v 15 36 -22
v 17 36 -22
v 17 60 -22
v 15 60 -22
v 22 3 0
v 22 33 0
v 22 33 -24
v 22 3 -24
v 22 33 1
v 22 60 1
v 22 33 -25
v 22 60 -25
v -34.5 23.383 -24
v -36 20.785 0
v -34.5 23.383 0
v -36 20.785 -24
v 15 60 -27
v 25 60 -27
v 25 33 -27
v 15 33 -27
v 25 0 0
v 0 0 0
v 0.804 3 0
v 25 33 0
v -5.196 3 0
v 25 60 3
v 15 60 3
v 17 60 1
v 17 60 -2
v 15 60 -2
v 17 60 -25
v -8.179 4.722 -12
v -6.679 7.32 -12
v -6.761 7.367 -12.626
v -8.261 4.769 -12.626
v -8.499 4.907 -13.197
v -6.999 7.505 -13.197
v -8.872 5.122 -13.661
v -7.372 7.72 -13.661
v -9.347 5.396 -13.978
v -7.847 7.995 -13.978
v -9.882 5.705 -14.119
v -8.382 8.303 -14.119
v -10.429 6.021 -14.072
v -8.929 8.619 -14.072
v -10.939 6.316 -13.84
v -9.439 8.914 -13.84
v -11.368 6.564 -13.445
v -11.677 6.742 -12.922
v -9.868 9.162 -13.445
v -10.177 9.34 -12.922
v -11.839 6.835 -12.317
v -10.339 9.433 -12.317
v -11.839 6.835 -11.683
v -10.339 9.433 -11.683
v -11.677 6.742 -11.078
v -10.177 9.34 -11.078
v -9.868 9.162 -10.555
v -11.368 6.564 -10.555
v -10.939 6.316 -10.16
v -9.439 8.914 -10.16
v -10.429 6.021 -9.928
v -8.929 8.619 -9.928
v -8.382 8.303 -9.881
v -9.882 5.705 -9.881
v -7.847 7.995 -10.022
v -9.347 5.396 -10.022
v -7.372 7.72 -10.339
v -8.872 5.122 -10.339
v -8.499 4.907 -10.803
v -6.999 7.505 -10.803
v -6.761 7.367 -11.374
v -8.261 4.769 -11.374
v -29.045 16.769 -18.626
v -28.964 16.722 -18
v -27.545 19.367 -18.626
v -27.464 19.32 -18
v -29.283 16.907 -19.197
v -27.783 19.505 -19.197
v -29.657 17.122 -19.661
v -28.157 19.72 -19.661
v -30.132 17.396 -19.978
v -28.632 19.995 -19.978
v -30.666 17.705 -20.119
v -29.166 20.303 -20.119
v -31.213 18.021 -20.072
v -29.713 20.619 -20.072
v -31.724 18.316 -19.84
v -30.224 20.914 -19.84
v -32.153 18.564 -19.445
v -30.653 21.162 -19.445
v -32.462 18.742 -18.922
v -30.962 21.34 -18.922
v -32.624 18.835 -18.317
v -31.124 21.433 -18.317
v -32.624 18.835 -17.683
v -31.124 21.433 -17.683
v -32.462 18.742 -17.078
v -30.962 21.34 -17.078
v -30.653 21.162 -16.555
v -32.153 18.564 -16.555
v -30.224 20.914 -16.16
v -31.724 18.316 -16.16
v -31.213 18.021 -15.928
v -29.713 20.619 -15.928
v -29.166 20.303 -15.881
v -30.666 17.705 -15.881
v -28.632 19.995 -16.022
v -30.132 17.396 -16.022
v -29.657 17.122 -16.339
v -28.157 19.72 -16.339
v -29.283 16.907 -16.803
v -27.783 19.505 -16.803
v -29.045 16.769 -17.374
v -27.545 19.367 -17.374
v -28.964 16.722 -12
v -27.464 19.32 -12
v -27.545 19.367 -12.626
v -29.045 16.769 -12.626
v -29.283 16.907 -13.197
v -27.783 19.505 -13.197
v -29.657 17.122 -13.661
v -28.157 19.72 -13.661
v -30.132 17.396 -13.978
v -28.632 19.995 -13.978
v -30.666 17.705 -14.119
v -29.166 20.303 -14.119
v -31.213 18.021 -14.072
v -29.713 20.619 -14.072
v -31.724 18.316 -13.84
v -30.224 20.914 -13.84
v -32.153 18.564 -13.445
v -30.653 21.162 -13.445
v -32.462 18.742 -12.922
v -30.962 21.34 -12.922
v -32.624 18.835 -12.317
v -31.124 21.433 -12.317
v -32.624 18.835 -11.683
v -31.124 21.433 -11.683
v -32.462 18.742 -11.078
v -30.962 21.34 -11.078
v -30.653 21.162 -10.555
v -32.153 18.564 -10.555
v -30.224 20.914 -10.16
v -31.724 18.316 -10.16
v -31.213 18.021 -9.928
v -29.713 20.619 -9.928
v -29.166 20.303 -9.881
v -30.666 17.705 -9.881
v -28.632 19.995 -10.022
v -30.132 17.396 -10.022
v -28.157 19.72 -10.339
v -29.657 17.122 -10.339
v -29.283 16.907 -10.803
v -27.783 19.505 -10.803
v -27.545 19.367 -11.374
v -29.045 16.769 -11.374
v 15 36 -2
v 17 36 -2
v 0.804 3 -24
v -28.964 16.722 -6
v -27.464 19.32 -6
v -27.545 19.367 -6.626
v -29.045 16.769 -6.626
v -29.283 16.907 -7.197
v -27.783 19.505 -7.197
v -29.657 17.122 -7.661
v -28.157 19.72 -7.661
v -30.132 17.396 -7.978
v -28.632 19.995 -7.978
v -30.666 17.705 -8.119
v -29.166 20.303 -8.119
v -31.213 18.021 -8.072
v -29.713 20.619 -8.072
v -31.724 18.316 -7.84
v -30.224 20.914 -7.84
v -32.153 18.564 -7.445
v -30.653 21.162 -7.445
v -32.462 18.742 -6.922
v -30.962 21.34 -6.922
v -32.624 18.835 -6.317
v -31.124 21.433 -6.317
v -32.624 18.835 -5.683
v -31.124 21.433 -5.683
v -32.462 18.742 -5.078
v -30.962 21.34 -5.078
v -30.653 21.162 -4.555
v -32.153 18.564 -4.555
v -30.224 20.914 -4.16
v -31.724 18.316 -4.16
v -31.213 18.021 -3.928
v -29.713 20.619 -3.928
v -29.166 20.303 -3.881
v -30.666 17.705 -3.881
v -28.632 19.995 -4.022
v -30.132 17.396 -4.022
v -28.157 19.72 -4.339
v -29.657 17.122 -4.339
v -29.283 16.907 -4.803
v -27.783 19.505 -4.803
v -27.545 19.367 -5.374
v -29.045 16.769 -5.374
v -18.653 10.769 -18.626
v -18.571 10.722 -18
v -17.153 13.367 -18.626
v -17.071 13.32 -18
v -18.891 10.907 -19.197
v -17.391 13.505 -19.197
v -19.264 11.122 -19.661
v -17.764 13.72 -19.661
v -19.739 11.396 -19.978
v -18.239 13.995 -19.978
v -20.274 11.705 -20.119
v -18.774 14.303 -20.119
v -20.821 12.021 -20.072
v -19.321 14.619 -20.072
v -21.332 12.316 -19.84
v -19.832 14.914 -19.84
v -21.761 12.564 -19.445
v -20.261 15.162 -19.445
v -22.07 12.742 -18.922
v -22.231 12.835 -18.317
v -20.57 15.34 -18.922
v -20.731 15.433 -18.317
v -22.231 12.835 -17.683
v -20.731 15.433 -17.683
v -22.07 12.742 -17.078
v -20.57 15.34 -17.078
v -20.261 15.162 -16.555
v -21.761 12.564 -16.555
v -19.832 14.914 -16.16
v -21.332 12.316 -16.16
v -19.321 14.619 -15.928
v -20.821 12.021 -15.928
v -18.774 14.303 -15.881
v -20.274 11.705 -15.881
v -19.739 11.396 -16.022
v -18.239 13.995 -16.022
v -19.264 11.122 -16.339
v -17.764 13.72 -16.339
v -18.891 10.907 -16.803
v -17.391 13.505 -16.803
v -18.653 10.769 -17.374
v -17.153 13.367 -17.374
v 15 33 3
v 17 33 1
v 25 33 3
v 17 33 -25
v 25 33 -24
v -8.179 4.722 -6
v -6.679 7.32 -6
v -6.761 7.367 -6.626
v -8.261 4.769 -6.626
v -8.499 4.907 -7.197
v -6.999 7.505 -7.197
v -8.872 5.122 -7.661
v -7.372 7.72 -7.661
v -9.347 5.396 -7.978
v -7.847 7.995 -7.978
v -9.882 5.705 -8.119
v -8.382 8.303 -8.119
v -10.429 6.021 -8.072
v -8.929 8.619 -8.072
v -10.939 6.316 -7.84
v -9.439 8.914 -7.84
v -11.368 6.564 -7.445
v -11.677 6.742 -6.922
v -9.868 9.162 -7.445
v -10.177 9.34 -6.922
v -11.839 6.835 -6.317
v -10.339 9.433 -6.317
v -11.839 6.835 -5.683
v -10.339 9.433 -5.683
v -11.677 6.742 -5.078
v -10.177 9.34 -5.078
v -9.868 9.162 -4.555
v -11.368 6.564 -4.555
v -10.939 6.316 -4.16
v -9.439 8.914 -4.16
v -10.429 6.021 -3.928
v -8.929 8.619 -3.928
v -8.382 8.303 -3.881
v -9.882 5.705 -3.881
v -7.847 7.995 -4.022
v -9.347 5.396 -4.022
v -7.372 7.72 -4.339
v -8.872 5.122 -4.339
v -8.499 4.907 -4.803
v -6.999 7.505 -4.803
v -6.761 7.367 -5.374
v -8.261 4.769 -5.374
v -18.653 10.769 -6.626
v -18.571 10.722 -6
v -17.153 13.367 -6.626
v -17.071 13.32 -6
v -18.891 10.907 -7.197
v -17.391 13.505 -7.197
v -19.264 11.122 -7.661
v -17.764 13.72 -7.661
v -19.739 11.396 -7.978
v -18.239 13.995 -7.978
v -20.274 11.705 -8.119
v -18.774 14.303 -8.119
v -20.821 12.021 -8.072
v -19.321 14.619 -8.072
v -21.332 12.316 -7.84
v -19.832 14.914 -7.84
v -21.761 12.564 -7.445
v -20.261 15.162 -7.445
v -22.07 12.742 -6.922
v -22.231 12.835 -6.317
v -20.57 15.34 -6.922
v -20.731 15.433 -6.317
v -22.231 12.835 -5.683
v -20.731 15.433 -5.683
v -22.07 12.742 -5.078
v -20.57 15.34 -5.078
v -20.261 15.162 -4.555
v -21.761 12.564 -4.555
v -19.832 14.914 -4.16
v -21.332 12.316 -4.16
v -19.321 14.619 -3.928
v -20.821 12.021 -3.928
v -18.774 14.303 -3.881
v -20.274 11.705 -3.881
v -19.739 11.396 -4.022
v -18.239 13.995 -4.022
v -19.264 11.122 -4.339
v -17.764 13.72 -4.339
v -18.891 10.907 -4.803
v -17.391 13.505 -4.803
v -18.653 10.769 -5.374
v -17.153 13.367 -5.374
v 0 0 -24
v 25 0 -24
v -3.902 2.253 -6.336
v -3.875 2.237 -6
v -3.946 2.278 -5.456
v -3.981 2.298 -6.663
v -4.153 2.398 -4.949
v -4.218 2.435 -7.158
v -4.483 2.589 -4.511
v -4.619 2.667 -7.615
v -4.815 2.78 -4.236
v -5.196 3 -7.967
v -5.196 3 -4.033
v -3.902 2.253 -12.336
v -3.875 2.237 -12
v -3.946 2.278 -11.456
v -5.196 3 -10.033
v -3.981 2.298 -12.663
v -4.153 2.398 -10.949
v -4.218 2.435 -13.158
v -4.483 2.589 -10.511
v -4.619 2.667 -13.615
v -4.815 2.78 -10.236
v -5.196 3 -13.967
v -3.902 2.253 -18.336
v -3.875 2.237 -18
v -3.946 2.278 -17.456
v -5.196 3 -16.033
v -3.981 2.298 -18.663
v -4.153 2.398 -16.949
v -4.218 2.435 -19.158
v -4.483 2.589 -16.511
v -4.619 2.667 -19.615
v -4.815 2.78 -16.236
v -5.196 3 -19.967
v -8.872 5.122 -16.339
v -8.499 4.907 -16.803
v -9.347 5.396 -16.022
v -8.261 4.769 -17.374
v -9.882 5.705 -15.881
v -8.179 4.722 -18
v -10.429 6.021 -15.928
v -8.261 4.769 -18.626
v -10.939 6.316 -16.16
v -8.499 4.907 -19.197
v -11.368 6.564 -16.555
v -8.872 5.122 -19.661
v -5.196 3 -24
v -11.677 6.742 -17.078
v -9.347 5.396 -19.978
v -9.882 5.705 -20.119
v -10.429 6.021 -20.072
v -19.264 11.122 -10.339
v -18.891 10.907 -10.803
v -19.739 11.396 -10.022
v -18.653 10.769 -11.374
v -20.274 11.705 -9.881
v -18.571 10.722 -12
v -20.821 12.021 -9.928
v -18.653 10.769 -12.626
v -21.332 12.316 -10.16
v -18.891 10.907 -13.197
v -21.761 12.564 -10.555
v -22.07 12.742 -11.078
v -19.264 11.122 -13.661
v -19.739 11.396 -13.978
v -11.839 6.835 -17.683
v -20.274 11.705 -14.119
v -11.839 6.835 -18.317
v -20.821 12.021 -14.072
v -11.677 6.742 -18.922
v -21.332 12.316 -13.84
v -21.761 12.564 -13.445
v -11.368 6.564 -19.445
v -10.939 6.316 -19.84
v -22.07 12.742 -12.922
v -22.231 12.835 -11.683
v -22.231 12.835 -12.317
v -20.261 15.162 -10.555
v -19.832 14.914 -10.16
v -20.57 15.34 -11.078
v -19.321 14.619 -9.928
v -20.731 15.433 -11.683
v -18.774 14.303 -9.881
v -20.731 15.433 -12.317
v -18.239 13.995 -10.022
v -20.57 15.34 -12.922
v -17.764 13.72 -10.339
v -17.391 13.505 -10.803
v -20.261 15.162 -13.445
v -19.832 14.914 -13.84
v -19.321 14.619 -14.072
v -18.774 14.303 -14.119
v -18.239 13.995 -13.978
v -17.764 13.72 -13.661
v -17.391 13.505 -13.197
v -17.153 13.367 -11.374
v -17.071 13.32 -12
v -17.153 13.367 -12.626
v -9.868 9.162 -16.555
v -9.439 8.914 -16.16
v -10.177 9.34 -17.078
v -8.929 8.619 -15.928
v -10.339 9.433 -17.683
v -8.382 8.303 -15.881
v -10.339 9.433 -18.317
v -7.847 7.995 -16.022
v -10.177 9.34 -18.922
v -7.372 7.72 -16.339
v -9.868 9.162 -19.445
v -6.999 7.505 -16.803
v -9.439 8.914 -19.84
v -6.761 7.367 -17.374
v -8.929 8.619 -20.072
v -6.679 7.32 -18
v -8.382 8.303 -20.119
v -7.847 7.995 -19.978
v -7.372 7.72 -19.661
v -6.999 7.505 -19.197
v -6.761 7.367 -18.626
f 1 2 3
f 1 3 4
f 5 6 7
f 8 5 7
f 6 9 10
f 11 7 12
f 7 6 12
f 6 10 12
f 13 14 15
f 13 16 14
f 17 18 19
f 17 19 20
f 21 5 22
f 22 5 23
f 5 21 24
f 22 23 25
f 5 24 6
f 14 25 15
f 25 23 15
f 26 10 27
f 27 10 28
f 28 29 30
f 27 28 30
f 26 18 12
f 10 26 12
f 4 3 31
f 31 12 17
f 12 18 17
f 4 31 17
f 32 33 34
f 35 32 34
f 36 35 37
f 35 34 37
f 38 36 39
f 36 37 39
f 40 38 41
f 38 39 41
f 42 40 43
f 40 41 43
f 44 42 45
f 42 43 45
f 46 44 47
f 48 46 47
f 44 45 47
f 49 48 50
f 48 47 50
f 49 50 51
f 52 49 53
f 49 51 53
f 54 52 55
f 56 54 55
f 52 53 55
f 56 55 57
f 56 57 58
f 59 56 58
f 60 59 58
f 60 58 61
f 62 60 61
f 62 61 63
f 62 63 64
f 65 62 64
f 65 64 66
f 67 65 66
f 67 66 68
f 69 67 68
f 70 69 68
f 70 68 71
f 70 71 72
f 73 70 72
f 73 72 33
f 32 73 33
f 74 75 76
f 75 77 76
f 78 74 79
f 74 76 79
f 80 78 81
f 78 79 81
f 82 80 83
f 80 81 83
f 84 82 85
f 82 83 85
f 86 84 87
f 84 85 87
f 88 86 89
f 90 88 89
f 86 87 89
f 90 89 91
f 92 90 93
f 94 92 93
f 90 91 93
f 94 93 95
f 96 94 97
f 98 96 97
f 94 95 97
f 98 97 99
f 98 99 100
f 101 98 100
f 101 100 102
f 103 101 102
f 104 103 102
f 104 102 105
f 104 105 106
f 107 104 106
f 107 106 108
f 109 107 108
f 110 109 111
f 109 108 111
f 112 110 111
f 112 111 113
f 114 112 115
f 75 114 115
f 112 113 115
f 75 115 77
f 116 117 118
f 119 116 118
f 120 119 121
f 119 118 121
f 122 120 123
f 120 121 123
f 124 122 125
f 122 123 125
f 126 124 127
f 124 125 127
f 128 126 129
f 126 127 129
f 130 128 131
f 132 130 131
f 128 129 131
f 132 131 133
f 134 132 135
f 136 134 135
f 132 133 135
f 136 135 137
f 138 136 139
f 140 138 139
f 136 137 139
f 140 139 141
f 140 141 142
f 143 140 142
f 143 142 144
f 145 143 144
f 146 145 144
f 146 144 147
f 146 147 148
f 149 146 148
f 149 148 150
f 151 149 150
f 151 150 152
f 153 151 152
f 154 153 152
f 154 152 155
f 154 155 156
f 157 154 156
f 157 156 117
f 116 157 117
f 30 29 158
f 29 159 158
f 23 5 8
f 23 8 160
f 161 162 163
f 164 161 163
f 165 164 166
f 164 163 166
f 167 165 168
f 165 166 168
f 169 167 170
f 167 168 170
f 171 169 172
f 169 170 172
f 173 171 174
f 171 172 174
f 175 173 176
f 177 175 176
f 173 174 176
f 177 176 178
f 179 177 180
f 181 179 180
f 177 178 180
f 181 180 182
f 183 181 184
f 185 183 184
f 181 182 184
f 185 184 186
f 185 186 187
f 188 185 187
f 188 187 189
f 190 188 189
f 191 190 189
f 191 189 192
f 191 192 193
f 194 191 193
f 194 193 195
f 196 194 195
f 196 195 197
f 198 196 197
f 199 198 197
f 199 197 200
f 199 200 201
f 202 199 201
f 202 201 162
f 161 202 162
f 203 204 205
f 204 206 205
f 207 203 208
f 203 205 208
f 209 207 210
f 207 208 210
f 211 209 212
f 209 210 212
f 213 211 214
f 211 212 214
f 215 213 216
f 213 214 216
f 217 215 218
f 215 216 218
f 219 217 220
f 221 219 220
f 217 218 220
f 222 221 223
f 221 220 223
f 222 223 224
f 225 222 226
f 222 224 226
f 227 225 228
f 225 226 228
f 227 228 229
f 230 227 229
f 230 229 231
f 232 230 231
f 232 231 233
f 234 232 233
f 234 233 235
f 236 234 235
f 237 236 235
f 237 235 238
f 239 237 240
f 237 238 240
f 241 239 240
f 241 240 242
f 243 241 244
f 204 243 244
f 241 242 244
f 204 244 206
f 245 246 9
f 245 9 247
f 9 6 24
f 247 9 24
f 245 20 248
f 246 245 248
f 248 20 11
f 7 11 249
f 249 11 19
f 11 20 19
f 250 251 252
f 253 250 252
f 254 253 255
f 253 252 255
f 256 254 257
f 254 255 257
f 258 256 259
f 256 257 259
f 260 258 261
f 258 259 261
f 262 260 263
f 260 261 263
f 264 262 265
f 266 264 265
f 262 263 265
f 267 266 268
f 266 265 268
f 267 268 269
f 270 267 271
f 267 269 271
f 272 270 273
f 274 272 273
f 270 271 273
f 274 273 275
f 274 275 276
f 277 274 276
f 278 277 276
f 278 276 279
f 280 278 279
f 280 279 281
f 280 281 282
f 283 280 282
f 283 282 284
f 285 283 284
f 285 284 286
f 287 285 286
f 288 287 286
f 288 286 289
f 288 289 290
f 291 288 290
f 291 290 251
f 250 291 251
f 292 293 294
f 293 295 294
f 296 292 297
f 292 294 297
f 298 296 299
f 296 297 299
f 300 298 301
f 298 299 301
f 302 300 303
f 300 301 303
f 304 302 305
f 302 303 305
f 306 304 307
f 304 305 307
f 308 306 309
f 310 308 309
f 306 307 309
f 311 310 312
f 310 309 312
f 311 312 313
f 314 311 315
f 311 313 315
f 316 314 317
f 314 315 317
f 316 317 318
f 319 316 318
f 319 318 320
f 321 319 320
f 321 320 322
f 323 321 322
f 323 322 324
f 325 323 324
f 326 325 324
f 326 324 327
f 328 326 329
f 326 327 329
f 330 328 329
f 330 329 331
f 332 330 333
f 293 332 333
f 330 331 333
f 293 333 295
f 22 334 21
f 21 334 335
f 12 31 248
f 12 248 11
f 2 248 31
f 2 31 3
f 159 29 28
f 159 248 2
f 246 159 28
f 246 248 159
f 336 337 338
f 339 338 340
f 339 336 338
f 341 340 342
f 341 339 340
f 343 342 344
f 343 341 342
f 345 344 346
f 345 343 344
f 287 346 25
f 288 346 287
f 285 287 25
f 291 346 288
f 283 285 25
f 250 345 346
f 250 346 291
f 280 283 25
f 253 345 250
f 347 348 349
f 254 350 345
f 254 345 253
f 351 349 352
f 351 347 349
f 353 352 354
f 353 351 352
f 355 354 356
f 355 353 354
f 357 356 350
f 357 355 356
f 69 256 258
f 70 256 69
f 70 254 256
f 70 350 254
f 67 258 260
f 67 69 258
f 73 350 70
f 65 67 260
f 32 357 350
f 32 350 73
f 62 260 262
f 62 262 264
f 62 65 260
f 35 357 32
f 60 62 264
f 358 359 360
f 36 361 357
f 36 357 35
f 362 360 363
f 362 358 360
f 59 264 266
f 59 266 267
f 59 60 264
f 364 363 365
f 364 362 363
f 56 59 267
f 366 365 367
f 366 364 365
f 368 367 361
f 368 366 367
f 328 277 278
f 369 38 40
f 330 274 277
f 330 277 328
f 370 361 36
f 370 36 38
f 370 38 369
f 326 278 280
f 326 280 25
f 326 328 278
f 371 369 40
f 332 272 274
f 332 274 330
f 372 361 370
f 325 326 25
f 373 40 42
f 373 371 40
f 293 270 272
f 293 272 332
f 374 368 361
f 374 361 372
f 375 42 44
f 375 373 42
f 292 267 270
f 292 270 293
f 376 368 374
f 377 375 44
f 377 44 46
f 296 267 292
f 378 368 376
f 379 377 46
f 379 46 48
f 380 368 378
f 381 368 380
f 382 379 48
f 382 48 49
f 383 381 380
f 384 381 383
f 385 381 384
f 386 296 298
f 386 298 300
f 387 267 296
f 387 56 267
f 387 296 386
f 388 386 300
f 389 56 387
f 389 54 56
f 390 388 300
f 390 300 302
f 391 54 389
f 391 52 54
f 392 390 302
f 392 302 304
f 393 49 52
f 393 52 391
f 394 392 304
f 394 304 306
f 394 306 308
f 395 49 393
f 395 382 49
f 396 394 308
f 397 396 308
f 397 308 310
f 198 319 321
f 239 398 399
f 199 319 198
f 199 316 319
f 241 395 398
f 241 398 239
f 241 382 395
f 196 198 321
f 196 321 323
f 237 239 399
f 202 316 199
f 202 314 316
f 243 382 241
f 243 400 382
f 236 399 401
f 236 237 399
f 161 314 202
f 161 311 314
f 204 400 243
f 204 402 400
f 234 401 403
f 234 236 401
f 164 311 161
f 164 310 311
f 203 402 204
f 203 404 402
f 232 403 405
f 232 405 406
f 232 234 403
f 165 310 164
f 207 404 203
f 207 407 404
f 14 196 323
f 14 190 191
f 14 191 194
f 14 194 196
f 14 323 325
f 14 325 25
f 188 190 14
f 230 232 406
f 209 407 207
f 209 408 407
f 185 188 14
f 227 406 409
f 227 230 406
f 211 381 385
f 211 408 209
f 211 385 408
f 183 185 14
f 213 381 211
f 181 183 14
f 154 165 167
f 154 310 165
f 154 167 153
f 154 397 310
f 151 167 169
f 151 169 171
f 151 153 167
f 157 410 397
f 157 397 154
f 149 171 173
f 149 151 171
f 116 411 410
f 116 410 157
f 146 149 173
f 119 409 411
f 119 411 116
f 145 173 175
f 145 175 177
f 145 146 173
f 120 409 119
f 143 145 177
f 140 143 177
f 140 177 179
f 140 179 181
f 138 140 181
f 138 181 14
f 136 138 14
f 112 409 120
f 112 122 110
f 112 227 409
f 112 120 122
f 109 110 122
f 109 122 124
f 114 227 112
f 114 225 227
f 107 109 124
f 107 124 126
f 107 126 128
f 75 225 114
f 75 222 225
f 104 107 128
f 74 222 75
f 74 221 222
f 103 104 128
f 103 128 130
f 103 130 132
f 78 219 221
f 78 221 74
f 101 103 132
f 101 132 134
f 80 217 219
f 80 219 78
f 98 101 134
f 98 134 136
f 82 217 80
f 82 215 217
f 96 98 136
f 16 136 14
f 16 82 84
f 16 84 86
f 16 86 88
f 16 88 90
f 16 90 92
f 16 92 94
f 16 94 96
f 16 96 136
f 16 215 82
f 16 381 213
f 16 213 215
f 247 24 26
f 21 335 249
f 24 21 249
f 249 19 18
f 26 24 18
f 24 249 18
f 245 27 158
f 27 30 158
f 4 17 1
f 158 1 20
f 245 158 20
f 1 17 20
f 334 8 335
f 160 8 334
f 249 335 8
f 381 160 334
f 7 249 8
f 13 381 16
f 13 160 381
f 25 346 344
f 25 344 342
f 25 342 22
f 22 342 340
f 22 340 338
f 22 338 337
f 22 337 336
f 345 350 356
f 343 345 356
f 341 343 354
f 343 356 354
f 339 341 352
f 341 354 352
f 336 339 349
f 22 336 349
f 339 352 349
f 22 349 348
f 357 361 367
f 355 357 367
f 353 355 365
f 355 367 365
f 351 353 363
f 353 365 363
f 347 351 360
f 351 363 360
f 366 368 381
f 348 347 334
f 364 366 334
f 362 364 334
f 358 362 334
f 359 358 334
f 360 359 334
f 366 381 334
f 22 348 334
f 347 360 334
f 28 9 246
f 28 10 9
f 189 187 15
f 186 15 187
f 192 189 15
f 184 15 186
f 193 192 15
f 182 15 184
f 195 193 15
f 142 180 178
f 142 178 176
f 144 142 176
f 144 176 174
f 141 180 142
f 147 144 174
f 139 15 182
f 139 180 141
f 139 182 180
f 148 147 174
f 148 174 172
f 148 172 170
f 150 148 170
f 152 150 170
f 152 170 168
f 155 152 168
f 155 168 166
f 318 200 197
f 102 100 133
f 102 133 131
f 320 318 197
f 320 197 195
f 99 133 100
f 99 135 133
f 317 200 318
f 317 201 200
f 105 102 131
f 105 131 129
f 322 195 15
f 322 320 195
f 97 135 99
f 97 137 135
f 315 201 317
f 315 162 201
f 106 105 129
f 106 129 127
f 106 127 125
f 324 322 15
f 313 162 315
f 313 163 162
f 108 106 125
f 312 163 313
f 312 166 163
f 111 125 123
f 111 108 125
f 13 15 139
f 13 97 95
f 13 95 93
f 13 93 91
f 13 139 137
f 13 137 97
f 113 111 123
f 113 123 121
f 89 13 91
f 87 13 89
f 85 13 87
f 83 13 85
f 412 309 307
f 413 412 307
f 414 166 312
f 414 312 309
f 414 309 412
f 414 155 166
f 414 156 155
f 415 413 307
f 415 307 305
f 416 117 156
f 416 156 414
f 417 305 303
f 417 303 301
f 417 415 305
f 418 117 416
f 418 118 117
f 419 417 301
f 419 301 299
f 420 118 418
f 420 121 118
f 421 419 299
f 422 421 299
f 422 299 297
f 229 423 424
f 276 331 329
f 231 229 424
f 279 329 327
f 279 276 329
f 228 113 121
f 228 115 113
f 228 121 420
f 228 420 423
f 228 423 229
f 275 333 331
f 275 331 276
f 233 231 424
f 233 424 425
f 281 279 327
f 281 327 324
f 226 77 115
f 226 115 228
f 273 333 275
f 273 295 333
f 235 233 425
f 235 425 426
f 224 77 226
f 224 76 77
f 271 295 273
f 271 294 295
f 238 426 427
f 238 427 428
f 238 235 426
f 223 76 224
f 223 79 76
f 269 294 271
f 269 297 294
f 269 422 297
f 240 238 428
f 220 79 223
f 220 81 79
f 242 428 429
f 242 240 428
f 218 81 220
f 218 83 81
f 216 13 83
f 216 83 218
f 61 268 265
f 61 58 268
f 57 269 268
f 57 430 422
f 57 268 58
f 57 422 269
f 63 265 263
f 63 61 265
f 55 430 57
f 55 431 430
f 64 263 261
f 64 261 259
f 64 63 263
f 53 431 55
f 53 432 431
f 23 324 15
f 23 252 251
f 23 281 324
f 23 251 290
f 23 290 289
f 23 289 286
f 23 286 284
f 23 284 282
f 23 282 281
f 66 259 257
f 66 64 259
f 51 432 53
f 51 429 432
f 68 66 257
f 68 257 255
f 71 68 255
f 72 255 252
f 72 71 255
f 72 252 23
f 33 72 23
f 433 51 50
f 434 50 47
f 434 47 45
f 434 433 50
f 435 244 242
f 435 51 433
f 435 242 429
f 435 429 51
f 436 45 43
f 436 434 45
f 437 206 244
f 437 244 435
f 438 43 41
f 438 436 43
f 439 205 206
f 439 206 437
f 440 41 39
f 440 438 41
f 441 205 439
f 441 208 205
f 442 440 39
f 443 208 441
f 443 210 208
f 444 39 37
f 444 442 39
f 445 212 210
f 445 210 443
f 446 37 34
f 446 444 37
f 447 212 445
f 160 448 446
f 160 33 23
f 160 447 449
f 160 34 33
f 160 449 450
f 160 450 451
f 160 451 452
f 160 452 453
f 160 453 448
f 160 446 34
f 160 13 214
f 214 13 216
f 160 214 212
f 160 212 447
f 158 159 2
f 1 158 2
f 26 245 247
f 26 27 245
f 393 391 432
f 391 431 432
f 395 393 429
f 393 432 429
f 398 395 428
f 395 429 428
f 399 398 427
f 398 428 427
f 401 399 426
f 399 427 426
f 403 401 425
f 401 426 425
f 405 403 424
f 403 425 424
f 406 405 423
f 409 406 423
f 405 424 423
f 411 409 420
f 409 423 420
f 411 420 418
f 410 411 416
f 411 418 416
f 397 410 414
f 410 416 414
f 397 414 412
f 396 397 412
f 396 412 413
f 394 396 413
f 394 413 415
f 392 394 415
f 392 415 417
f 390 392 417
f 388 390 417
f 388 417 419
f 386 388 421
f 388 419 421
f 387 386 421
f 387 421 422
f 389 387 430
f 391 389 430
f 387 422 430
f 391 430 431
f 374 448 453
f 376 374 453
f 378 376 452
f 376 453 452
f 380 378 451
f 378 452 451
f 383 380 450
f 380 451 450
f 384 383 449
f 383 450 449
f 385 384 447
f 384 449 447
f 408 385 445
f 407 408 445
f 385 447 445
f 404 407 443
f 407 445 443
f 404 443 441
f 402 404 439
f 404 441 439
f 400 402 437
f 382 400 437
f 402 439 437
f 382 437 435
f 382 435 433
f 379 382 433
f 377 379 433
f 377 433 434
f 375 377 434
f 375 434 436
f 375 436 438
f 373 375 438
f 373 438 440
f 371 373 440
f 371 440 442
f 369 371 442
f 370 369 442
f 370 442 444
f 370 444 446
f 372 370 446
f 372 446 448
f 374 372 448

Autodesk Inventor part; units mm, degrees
ref_plane "YZ Plane" through (0, 0, 0) normal (1, 0, 0) x (0, 1, 0)
ref_plane "XZ Plane" through (0, 0, 0) normal (0, 1, 0) x (-1, 0, 0)
ref_plane "XY Plane" through (0, 0, 0) normal (0, 0, 1) x (1, 0, 0)
sketch "Sketch1" plane through (0, 0, 0) normal (0, 1, 0) x (-1, 0, 0)
  line L0 (0, 0) -> (36, 0)
  line L1 (36, 0) -> (36, -24)
  line L2 (36, -24) -> (0, -24)
  line L3 (0, -24) -> (0, 0)
  dimension "d0" = 36
  dimension "d1" = 24
extrude "Extrusion1" add sketch "Sketch1" along normal blind 3
sketch "Sketch2" plane through (0, 3, 0) normal (0, 1, 0) x (1, 0, 0)
  circle A0 centre (-6, 12) radius 2.125
  point P0 (0, 0)
  dimension "d4" = 4.25
extrude "Extrusion2" cut sketch "Sketch2" against normal through all
pattern_linear "Rectangular Pattern1" count 3 spacing 12 along (-1, 0, 0) count 3 spacing 6 along (0, 0, 1) of "Extrusion2" second direction both ways yes
sketch "Sketch3" plane through (0, 0, 0) normal (1, 0, 0) x (0, 0, -1)
  line L0 (0, 0) -> (24, 0)
  line L1 (24, 0) -> (24, 3)
  line L2 (24, 3) -> (0, 3)
  line L3 (0, 3) -> (0, 0)
extrude "Extrusion3" add sketch "Sketch3" along normal blind 25
sketch "Sketch4" plane through (0, 3, 0) normal (0, 1, 0) x (1, 0, 0)
  line L0 (-36, 24) -> (25, 24) projected
  line L1 (25, 0) -> (22, 0)
  line L2 (22, 0) -> (22, 24)
  line L3 (22, 24) -> (25, 24)
  line L4 (25, 24) -> (25, 0)
  point P0 (0, 0)
  dimension "d15" = 3
extrude "Extrusion4" add sketch "Sketch4" along normal blind 57
sketch "Sketch5" plane through (22, 3, -24) normal (-1, 0, 0) x (0, 0, 1)
  line L0 (24, 57) -> (24, 33)
  line L1 (24, -3) -> (24, 57) projected
  line L2 (0, -3) -> (0, 57) projected
  line L3 (24, 33) -> (0, 33)
  line L4 (0, 33) -> (0, 30)
  line L5 (0, 30) -> (24, 30)
  line L6 (24, 30) -> (24, 33)
  dimension "d18" = 24
  dimension "d19" = 3
extrude "Extrusion5" add sketch "Sketch5" along normal blind 7
sketch "Sketch6" plane through (22, 36, 0) normal (0, 1, 0) x (1, 0, 0)
  line L0 (-7, 0) -> (-5, 0)
  line L1 (-5, 0) -> (-5, 2)
  line L2 (-5, 2) -> (-7, 2)
  line L3 (-7, 2) -> (-7, 0)
  line L4 (-7, 24) -> (-5, 24)
  line L5 (-5, 24) -> (-5, 22)
  line L6 (-5, 22) -> (-7, 22)
  line L7 (-7, 22) -> (-7, 24)
  point P0 (-22, 0)
  dimension "d22" = 2
  dimension "d23" = 2
  dimension "d24" = 2
  dimension "d25" = 2
extrude "Extrusion6" add sketch "Sketch6" along normal blind 24
sketch "Sketch7" plane through (25, 0, -24) normal (0, 0, -1) x (-1, 0, 0)
  line L0 (0, 60) -> (10, 60)
  line L1 (10, 60) -> (10, 33)
  line L2 (10, 33) -> (0, 33)
  line L3 (0, 33) -> (0, 60)
  point P0 (25, 0)
extrude "Extrusion7" add sketch "Sketch7" along normal blind 3
sketch "Sketch8" plane through (-36, 0, 0) normal (0, 0, 1) x (1, 0, 0)
  line L0 (51, 33) -> (61, 33)
  line L1 (61, 33) -> (61, 60)
  line L2 (61, 60) -> (51, 60)
  line L3 (51, 60) -> (51, 33)
  point P0 (36, 0)
extrude "Extrusion8" add sketch "Sketch8" along normal blind 3
sketch "Sketch9" plane through (-36, 0, 0) normal (0, 0, 1) x (1, 0, 0)
  line L0 (0, 0) -> (61, 0)
  line L1 (61, 0) -> (61, 33)
  line L2 (61, 33) -> (0, 33)
  line L3 (0, 33) -> (0, 0)
  point P0 (36, 0)
sketch "Sketch10" plane through (0, 60, 0) normal (0, 1, 0) x (1, 0, 0)
  line L0 (22, 0) -> (22, -1)
  line L1 (22, 24) -> (22, 25)
  line L2 (22, -1) -> (17, -1)
  line L3 (17, -1) -> (17, 25)
  line L4 (17, 25) -> (22, 25)
  line L5 (22, 25) -> (22, -1)
  point P0 (0, 0)
  dimension "d34" = 1
  dimension "d35" = 1
extrude "Extrusion10" cut sketch "Sketch10" against normal through all
sketch "Sketch11" plane through (-36, 0, -24) normal (0, 0, -1) x (-1, 0, 0)
  line L0 (-58, 33) -> (-58, 0) projected
  line L1 (-53, 0) -> (-58, 0)
  line L2 (-58, 0) -> (-58, 3)
  line L3 (-58, 3) -> (-53, 3)
  line L4 (-53, 3) -> (-53, 0)
  point P0 (-36, 0)
extrude "Extrusion11" add sketch "Sketch11" against normal blind 24
sketch "Sketch12" plane through (-36, 0, -24) normal (0, 0, -1) x (-1, 0, 0)
  line L0 (-36, 0) -> (0, 20.7846)
  line L1 (-36, 0) -> (5.5692, 0) construction
  line L2 (0, 20.7846) -> (-1.5, 23.3827)
  line L3 (-1.5, 23.3827) -> (-37.5, 2.5981)
  line L4 (-37.5, 2.5981) -> (-36, 0)
  dimension "d47" = 30
  dimension "d48" = 3
ref_plane "Work Plane1" through (0.3404, 3, 0) normal (0.2240446, 0.9745789, 0) x (0.9745789, -0.2240446, 0)
extrude "Extrusion14" add sketch "Sketch12" against normal blind 24
sketch "Sketch15" plane through (-36, 0, -24) normal (0, 0, -1) x (-1, 0, 0)
  line L0 (0, 3) -> (-30.8038, 3)
  line L1 (0, 3) -> (-30.8038, 3) projected
  line L2 (-30.8038, 3) -> (-36, 0)
  line L3 (-36, 0) -> (0, 0)
  line L4 (0, 0) -> (-61, 0) projected
  line L5 (0, 0) -> (0, 3)
extrude "Extrusion15" cut sketch "Sketch15" against normal through all
sketch "Sketch16" plane through (0.8038, 3, 0) normal (0.5, 0.8660254, 0) x (0.8660254, -0.5, 0)
  line L0 (-40.7654, 24) -> (-40.7654, 0) projected
  line L1 (-40.7654, 12) -> (-34.7654, 12)
  circle A0 centre (-34.7654, 12) radius 2.125
  point P0 (0.8038, 0)
  dimension "d53" = 6
  dimension "d54" = 4.25
extrude "Extrusion16" cut sketch "Sketch16" against normal through all
pattern_linear "Rectangular Pattern2" count 3 spacing 12 along (0.8660254, -0.5, 0) count 3 spacing 6 along (0, 0, 1) of "Extrusion16" second direction both ways yes
equation "\"d5\" = d4"
properties part number "PiCamWalkerMount"
